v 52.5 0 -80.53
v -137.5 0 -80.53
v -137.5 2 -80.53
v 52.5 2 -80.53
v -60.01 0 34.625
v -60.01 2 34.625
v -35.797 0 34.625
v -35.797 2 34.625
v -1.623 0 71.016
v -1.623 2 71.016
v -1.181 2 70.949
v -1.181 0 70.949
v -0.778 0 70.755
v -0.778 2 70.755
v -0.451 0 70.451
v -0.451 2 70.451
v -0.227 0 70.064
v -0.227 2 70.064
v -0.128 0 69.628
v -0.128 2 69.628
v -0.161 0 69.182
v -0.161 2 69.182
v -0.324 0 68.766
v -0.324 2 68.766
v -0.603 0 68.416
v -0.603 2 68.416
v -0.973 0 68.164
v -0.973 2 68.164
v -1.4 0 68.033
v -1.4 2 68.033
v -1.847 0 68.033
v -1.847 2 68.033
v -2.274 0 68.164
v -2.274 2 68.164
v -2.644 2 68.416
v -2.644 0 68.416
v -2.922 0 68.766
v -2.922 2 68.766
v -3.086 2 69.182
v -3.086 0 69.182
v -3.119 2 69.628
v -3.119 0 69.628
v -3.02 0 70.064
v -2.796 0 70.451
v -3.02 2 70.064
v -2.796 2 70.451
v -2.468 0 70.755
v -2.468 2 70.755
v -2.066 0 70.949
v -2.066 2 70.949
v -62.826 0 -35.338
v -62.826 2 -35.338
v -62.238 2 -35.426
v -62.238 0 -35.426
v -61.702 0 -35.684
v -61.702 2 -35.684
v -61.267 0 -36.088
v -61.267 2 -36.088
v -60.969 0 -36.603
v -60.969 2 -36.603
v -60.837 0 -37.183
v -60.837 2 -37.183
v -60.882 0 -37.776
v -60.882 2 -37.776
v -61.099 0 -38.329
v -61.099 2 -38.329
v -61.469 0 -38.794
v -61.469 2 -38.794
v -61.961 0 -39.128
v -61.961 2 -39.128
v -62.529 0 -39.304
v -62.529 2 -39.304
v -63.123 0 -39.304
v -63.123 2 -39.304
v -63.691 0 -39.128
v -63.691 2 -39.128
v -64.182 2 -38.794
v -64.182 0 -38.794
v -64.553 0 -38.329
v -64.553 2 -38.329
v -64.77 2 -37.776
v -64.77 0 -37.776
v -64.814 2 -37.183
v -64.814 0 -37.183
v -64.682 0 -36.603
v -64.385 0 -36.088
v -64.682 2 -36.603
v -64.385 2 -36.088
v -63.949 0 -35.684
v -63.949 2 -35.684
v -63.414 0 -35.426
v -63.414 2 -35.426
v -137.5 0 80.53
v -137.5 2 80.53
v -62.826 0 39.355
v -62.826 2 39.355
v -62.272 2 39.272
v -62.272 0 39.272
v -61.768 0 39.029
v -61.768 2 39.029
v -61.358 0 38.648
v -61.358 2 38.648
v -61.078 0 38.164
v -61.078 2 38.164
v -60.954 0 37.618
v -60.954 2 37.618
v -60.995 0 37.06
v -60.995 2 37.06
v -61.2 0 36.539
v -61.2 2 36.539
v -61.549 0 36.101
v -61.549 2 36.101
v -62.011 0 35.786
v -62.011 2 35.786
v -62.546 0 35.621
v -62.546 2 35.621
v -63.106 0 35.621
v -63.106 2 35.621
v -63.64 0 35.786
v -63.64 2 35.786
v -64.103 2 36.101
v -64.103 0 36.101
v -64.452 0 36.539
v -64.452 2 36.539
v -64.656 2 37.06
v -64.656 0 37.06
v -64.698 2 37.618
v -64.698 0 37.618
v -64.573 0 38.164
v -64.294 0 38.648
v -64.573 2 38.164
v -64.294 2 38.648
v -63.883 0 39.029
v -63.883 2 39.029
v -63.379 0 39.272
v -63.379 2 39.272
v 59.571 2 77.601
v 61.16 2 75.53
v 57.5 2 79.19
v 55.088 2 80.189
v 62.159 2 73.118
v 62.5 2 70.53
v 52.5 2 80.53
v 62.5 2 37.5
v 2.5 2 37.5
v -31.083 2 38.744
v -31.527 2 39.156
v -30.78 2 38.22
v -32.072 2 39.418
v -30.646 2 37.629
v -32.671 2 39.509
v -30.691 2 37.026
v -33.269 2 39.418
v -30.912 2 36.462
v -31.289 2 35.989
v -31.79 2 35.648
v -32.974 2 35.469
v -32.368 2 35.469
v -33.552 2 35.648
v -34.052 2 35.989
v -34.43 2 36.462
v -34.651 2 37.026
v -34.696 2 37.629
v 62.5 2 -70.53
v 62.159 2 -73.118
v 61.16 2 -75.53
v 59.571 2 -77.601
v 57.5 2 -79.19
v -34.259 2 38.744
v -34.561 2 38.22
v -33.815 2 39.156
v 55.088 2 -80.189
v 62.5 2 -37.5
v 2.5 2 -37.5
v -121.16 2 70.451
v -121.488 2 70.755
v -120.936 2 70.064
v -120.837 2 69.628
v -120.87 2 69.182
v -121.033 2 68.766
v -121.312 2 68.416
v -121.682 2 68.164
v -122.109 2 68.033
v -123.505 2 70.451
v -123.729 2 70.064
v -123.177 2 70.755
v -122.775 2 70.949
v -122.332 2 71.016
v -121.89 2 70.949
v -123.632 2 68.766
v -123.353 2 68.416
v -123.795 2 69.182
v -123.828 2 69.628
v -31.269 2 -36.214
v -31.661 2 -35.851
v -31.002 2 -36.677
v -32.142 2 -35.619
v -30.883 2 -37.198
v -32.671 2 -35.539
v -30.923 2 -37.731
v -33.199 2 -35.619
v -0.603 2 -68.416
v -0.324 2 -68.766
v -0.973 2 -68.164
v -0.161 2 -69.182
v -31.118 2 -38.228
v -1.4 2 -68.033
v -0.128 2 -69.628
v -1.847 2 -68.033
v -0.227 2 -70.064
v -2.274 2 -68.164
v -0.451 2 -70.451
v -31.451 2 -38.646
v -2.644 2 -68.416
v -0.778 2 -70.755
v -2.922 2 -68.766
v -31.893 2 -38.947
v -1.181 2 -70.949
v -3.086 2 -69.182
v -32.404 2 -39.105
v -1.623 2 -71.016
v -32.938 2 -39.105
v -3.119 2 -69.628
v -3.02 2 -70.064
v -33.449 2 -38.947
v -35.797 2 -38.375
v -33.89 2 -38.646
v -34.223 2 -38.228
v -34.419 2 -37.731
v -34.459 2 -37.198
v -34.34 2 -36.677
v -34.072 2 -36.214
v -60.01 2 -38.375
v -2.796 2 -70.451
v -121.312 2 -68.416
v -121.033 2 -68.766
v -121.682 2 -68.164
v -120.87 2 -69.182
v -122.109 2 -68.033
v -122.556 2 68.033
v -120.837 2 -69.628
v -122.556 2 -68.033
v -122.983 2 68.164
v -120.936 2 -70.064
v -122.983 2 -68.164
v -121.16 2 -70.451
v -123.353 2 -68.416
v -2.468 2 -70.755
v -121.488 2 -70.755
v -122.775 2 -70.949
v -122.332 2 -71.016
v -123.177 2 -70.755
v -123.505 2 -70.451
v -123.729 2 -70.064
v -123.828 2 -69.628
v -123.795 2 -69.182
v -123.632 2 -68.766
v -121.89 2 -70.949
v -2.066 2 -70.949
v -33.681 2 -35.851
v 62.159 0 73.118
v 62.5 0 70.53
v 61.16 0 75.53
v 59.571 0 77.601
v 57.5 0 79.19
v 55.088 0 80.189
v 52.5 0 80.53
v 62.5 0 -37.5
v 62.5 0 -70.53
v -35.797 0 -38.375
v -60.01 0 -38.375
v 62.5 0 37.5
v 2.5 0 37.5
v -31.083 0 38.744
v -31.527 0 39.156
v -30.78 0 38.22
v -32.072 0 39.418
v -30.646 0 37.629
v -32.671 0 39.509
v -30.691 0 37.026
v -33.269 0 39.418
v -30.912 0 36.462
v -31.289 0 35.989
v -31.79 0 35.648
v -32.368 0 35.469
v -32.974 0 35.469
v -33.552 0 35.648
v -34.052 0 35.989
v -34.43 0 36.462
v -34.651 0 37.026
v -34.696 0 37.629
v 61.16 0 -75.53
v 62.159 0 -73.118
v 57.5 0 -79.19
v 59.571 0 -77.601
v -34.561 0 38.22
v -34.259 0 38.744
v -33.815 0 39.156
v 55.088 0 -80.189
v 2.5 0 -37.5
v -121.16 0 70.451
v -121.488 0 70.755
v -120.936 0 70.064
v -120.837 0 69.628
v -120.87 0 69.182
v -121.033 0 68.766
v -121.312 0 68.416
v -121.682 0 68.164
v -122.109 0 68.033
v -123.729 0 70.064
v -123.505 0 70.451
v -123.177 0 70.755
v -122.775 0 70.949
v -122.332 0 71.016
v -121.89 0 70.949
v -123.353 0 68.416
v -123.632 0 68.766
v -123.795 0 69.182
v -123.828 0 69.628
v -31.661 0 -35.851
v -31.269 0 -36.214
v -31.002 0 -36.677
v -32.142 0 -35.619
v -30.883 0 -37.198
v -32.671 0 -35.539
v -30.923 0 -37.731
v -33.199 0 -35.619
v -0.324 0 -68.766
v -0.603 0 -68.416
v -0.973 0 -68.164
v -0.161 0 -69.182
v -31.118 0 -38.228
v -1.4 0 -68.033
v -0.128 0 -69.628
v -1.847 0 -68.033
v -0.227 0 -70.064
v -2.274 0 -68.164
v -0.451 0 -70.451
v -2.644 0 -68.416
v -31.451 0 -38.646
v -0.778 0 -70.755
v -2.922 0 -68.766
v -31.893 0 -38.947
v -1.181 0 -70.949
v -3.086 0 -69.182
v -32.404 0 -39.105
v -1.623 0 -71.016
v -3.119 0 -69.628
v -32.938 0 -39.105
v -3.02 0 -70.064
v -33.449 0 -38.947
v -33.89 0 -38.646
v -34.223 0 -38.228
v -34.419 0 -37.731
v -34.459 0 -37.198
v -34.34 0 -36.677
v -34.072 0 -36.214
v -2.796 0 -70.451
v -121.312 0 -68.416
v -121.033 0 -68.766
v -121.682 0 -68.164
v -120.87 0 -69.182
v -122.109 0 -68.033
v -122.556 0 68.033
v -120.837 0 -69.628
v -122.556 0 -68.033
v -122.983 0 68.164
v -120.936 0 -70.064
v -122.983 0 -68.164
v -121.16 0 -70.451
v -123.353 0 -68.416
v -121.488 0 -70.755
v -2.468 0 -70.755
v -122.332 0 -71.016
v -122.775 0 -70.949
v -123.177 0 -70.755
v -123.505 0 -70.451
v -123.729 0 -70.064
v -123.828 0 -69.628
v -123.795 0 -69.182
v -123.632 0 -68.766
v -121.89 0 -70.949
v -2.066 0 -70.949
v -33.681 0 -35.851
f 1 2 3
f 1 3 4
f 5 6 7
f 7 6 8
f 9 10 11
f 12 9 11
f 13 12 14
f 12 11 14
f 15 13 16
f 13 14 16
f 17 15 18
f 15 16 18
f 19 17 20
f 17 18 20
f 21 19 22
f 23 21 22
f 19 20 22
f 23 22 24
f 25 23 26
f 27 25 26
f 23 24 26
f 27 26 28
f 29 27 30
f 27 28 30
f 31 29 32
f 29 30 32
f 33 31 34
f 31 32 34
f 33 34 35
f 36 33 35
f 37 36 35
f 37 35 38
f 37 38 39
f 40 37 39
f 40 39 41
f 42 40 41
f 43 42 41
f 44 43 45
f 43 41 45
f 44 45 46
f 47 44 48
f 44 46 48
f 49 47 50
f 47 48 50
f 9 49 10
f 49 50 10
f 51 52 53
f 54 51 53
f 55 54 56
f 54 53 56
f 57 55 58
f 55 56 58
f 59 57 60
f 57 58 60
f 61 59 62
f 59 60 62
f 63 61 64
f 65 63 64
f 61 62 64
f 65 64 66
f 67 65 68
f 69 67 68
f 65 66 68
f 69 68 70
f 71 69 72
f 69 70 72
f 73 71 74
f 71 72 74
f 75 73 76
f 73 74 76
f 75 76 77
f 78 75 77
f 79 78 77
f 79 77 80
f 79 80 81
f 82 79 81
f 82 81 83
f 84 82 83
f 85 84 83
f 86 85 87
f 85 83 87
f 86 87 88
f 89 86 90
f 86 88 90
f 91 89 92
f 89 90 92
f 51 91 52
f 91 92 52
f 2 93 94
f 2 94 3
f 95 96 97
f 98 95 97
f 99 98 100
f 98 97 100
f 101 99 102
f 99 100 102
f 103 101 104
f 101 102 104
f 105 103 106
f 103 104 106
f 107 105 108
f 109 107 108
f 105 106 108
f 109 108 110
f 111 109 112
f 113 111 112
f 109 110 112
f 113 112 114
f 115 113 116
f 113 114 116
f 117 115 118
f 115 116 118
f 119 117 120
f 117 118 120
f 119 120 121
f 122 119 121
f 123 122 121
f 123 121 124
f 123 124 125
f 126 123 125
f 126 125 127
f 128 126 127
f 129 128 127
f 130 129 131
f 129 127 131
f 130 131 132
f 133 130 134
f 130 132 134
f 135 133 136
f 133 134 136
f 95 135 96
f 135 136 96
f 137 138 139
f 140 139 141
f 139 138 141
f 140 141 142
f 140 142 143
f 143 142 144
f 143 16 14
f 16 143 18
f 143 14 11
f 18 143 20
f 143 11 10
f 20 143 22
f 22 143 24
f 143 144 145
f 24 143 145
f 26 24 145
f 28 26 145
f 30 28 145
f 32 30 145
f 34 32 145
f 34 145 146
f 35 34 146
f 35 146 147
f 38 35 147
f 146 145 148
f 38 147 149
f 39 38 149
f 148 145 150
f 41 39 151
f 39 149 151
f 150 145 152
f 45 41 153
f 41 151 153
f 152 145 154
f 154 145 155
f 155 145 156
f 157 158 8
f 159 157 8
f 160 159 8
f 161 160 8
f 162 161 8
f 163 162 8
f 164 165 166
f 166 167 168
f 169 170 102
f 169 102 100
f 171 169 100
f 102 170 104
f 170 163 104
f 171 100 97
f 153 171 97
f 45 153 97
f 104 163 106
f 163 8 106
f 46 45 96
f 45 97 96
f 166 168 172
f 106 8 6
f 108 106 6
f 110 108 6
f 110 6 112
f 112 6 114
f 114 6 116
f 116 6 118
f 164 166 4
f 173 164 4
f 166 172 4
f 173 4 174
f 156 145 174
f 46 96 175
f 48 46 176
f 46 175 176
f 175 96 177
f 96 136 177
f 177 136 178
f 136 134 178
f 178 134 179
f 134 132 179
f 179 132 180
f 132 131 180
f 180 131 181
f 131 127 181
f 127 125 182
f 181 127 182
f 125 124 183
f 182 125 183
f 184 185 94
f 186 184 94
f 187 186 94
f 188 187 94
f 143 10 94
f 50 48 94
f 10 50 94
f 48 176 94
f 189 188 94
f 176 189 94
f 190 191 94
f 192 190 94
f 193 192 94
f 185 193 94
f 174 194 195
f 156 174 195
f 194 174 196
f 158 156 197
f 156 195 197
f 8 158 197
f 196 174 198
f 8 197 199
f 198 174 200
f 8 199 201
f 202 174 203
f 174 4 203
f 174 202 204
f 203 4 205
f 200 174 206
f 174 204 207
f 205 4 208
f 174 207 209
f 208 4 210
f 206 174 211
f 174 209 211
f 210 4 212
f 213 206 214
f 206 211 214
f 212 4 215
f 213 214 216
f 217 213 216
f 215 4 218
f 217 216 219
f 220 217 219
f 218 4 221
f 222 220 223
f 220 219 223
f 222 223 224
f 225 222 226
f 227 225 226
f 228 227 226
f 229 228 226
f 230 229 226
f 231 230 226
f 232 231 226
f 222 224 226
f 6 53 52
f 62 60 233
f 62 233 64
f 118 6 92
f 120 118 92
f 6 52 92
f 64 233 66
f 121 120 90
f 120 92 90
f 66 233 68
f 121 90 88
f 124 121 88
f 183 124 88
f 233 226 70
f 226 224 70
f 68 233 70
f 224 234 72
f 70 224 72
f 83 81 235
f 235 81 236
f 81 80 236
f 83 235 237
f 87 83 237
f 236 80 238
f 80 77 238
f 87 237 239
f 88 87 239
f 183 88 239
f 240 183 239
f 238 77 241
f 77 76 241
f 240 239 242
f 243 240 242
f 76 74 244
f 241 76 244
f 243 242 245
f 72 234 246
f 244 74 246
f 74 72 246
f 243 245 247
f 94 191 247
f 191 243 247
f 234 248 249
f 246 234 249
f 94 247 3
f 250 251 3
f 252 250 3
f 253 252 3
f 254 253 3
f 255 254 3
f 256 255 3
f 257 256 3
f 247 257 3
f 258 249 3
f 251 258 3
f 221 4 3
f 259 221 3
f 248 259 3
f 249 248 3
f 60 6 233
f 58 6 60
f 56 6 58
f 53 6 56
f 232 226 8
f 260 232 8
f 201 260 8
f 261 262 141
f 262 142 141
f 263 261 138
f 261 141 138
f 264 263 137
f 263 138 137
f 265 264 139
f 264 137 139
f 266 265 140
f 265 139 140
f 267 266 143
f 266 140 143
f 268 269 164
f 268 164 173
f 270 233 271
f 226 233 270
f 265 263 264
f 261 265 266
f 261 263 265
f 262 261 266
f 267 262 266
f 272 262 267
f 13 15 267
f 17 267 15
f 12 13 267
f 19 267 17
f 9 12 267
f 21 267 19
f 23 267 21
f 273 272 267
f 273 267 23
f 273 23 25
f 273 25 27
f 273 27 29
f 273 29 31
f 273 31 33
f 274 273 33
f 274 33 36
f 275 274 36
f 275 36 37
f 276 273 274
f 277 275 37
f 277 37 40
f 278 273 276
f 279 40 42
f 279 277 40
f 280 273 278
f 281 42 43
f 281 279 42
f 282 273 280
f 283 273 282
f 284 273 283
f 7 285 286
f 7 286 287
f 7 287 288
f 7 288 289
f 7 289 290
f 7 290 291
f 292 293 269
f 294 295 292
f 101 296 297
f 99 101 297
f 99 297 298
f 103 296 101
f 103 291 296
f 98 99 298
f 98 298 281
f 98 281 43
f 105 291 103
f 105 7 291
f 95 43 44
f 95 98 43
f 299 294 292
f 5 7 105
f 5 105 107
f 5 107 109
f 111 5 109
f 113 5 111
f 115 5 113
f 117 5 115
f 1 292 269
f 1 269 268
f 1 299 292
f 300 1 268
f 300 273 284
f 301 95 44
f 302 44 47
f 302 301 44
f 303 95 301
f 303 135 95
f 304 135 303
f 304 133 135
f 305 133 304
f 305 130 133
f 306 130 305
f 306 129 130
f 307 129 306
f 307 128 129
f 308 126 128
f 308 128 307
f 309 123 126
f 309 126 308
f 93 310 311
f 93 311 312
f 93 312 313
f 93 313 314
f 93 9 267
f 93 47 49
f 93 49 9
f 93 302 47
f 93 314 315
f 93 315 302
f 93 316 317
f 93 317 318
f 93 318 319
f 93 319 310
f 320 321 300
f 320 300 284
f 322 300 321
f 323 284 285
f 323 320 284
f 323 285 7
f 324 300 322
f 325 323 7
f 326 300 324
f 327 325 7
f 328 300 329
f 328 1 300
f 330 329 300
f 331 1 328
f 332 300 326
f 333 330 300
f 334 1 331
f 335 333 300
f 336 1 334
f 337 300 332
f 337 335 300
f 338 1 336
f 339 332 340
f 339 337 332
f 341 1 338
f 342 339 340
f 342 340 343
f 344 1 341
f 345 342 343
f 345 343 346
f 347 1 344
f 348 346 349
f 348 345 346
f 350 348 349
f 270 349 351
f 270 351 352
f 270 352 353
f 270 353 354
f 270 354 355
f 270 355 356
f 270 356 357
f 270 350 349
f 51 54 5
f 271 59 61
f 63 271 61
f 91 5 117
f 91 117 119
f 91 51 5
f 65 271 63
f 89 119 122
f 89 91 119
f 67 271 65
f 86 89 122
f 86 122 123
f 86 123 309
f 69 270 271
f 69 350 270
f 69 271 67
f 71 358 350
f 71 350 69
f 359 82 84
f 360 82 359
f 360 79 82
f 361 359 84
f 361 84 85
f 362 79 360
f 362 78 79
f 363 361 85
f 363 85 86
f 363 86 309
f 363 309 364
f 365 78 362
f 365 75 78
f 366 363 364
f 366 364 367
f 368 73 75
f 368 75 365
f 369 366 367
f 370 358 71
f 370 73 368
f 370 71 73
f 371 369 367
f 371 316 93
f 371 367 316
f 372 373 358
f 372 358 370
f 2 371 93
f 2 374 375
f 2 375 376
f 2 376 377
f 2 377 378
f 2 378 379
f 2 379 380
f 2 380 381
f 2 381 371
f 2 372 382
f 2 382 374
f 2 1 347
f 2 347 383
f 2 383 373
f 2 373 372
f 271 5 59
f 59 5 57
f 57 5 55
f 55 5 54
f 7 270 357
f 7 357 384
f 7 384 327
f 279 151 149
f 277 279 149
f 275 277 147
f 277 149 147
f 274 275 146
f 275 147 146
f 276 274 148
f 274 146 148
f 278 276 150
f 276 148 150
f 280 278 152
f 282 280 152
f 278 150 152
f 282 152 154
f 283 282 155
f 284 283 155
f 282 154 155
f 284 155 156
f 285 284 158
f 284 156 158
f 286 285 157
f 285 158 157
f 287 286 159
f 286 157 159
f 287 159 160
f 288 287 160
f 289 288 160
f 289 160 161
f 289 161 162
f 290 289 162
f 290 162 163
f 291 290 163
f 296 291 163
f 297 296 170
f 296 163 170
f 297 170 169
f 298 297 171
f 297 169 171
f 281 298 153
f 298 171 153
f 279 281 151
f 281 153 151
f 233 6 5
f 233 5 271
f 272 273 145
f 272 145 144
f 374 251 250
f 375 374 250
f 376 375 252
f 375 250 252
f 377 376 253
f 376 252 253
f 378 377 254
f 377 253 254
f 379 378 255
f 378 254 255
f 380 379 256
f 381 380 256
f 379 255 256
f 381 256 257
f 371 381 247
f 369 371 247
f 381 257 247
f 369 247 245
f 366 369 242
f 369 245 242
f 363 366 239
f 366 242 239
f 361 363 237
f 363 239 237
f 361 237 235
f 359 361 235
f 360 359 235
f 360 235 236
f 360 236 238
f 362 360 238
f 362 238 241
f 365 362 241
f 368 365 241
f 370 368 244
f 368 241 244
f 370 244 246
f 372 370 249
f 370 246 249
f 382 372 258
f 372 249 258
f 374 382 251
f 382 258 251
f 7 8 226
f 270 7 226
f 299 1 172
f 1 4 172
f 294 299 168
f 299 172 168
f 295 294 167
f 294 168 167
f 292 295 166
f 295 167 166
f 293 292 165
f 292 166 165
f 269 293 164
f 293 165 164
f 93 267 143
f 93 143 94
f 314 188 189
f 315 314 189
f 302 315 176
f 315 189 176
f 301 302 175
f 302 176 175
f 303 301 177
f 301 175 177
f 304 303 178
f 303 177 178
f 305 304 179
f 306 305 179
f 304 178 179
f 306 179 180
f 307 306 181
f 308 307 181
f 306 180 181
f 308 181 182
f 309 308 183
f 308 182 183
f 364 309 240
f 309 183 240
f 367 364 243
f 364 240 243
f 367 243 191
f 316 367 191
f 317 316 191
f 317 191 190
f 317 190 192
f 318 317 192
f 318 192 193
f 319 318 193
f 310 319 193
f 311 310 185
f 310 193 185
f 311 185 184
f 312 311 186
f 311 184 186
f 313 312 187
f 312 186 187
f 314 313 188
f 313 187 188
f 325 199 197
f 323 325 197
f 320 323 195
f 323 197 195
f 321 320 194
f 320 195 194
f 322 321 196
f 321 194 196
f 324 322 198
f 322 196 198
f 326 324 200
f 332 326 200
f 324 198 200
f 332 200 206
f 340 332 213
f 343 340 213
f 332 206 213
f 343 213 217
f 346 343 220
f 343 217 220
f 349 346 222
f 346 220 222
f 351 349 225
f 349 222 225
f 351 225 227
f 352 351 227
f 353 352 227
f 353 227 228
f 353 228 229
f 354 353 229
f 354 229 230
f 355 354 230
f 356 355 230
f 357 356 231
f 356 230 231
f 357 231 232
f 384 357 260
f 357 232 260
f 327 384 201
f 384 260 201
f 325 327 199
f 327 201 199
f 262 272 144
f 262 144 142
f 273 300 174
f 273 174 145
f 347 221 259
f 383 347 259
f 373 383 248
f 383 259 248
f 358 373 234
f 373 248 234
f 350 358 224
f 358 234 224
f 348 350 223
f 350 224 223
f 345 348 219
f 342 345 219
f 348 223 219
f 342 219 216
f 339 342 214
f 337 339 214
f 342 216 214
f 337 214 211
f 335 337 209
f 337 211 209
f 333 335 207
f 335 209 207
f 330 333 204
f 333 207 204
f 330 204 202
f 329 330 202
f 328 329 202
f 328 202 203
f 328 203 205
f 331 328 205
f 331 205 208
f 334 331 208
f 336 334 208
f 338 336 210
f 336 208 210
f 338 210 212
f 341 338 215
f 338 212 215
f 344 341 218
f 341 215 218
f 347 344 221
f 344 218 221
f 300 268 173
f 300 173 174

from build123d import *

# Parameters (mm, degrees)
BOSS_EXTRUDE1_DEPTH = 2
SKETCH2_R           = 1.5
SKETCH2_R_2         = 1.792766803
SKETCH2_R_3         = 1.994190211
SKETCH2_R_4         = 1.877433279
SKETCH2_R_5         = 2.03091858
SKETCH2_W           = 24.212513721
SKETCH2_H           = 73
CUT_EXTRUDE1_DEPTH  = 2
FILLET1_R           = 10


with BuildPart() as part:
    # Sketch1 → Boss-Extrude1 (new body)
    with BuildSketch(Plane(origin=(0, 0, 0), x_dir=(1, 0, 0), z_dir=(0, 1, 0))):
        Polygon((62.5, -37.5), (62.5, -80.53), (-137.5, -80.53), (-137.5, 80.53), (62.5, 80.53), (62.5, 37.5), (2.5, 37.5), (2.5, -37.5), align=None)
    extrude(amount=BOSS_EXTRUDE1_DEPTH)

    # Sketch2 → Cut-Extrude1 (cut)
    with BuildSketch(Plane(origin=(0, 2, 0), x_dir=(1, 0, 0), z_dir=(0, 1, 0))):
        with Locations(Location((-122.332492344, -69.515826612, 0), (0, 0, 270))):
            Circle(SKETCH2_R)
        with Locations(Location((-1.623456056, -69.515826612, 0), (0, 0, 270))):
            Circle(SKETCH2_R)
        with Locations(Location((-122.332492344, 69.515826612, 0), (0, 0, 90))):
            Circle(SKETCH2_R)
        with Locations(Location((-1.623456056, 69.515826612, 0), (0, 0, 90))):
            Circle(SKETCH2_R)
        with Locations(Location((-32.670840378, 37.331781413, 0), (0, 0, 270))):
            Circle(SKETCH2_R_2)
        with Locations(Location((-62.825802134, 37.331781413, 0), (0, 0, 270))):
            Circle(SKETCH2_R_3)
        with Locations(Location((-62.825802134, -37.477675213, 0), (0, 0, 270))):
            Circle(SKETCH2_R_4)
        with Locations(Location((-32.670840378, -37.477675213, 0), (0, 0, 270))):
            Circle(SKETCH2_R_5)
        with Locations((-47.903394007, 1.875391481)):
            Rectangle(SKETCH2_W, SKETCH2_H)
    extrude(amount=-CUT_EXTRUDE1_DEPTH, mode=Mode.SUBTRACT)

    # Fillet1
    fillet1_edges = [part.edges().sort_by_distance(p)[0] for p in [
        (62.5, 1, -80.53),
        (62.5, 1, 80.53),
    ]]
    fillet(fillet1_edges, radius=FILLET1_R)


solid = part.part
